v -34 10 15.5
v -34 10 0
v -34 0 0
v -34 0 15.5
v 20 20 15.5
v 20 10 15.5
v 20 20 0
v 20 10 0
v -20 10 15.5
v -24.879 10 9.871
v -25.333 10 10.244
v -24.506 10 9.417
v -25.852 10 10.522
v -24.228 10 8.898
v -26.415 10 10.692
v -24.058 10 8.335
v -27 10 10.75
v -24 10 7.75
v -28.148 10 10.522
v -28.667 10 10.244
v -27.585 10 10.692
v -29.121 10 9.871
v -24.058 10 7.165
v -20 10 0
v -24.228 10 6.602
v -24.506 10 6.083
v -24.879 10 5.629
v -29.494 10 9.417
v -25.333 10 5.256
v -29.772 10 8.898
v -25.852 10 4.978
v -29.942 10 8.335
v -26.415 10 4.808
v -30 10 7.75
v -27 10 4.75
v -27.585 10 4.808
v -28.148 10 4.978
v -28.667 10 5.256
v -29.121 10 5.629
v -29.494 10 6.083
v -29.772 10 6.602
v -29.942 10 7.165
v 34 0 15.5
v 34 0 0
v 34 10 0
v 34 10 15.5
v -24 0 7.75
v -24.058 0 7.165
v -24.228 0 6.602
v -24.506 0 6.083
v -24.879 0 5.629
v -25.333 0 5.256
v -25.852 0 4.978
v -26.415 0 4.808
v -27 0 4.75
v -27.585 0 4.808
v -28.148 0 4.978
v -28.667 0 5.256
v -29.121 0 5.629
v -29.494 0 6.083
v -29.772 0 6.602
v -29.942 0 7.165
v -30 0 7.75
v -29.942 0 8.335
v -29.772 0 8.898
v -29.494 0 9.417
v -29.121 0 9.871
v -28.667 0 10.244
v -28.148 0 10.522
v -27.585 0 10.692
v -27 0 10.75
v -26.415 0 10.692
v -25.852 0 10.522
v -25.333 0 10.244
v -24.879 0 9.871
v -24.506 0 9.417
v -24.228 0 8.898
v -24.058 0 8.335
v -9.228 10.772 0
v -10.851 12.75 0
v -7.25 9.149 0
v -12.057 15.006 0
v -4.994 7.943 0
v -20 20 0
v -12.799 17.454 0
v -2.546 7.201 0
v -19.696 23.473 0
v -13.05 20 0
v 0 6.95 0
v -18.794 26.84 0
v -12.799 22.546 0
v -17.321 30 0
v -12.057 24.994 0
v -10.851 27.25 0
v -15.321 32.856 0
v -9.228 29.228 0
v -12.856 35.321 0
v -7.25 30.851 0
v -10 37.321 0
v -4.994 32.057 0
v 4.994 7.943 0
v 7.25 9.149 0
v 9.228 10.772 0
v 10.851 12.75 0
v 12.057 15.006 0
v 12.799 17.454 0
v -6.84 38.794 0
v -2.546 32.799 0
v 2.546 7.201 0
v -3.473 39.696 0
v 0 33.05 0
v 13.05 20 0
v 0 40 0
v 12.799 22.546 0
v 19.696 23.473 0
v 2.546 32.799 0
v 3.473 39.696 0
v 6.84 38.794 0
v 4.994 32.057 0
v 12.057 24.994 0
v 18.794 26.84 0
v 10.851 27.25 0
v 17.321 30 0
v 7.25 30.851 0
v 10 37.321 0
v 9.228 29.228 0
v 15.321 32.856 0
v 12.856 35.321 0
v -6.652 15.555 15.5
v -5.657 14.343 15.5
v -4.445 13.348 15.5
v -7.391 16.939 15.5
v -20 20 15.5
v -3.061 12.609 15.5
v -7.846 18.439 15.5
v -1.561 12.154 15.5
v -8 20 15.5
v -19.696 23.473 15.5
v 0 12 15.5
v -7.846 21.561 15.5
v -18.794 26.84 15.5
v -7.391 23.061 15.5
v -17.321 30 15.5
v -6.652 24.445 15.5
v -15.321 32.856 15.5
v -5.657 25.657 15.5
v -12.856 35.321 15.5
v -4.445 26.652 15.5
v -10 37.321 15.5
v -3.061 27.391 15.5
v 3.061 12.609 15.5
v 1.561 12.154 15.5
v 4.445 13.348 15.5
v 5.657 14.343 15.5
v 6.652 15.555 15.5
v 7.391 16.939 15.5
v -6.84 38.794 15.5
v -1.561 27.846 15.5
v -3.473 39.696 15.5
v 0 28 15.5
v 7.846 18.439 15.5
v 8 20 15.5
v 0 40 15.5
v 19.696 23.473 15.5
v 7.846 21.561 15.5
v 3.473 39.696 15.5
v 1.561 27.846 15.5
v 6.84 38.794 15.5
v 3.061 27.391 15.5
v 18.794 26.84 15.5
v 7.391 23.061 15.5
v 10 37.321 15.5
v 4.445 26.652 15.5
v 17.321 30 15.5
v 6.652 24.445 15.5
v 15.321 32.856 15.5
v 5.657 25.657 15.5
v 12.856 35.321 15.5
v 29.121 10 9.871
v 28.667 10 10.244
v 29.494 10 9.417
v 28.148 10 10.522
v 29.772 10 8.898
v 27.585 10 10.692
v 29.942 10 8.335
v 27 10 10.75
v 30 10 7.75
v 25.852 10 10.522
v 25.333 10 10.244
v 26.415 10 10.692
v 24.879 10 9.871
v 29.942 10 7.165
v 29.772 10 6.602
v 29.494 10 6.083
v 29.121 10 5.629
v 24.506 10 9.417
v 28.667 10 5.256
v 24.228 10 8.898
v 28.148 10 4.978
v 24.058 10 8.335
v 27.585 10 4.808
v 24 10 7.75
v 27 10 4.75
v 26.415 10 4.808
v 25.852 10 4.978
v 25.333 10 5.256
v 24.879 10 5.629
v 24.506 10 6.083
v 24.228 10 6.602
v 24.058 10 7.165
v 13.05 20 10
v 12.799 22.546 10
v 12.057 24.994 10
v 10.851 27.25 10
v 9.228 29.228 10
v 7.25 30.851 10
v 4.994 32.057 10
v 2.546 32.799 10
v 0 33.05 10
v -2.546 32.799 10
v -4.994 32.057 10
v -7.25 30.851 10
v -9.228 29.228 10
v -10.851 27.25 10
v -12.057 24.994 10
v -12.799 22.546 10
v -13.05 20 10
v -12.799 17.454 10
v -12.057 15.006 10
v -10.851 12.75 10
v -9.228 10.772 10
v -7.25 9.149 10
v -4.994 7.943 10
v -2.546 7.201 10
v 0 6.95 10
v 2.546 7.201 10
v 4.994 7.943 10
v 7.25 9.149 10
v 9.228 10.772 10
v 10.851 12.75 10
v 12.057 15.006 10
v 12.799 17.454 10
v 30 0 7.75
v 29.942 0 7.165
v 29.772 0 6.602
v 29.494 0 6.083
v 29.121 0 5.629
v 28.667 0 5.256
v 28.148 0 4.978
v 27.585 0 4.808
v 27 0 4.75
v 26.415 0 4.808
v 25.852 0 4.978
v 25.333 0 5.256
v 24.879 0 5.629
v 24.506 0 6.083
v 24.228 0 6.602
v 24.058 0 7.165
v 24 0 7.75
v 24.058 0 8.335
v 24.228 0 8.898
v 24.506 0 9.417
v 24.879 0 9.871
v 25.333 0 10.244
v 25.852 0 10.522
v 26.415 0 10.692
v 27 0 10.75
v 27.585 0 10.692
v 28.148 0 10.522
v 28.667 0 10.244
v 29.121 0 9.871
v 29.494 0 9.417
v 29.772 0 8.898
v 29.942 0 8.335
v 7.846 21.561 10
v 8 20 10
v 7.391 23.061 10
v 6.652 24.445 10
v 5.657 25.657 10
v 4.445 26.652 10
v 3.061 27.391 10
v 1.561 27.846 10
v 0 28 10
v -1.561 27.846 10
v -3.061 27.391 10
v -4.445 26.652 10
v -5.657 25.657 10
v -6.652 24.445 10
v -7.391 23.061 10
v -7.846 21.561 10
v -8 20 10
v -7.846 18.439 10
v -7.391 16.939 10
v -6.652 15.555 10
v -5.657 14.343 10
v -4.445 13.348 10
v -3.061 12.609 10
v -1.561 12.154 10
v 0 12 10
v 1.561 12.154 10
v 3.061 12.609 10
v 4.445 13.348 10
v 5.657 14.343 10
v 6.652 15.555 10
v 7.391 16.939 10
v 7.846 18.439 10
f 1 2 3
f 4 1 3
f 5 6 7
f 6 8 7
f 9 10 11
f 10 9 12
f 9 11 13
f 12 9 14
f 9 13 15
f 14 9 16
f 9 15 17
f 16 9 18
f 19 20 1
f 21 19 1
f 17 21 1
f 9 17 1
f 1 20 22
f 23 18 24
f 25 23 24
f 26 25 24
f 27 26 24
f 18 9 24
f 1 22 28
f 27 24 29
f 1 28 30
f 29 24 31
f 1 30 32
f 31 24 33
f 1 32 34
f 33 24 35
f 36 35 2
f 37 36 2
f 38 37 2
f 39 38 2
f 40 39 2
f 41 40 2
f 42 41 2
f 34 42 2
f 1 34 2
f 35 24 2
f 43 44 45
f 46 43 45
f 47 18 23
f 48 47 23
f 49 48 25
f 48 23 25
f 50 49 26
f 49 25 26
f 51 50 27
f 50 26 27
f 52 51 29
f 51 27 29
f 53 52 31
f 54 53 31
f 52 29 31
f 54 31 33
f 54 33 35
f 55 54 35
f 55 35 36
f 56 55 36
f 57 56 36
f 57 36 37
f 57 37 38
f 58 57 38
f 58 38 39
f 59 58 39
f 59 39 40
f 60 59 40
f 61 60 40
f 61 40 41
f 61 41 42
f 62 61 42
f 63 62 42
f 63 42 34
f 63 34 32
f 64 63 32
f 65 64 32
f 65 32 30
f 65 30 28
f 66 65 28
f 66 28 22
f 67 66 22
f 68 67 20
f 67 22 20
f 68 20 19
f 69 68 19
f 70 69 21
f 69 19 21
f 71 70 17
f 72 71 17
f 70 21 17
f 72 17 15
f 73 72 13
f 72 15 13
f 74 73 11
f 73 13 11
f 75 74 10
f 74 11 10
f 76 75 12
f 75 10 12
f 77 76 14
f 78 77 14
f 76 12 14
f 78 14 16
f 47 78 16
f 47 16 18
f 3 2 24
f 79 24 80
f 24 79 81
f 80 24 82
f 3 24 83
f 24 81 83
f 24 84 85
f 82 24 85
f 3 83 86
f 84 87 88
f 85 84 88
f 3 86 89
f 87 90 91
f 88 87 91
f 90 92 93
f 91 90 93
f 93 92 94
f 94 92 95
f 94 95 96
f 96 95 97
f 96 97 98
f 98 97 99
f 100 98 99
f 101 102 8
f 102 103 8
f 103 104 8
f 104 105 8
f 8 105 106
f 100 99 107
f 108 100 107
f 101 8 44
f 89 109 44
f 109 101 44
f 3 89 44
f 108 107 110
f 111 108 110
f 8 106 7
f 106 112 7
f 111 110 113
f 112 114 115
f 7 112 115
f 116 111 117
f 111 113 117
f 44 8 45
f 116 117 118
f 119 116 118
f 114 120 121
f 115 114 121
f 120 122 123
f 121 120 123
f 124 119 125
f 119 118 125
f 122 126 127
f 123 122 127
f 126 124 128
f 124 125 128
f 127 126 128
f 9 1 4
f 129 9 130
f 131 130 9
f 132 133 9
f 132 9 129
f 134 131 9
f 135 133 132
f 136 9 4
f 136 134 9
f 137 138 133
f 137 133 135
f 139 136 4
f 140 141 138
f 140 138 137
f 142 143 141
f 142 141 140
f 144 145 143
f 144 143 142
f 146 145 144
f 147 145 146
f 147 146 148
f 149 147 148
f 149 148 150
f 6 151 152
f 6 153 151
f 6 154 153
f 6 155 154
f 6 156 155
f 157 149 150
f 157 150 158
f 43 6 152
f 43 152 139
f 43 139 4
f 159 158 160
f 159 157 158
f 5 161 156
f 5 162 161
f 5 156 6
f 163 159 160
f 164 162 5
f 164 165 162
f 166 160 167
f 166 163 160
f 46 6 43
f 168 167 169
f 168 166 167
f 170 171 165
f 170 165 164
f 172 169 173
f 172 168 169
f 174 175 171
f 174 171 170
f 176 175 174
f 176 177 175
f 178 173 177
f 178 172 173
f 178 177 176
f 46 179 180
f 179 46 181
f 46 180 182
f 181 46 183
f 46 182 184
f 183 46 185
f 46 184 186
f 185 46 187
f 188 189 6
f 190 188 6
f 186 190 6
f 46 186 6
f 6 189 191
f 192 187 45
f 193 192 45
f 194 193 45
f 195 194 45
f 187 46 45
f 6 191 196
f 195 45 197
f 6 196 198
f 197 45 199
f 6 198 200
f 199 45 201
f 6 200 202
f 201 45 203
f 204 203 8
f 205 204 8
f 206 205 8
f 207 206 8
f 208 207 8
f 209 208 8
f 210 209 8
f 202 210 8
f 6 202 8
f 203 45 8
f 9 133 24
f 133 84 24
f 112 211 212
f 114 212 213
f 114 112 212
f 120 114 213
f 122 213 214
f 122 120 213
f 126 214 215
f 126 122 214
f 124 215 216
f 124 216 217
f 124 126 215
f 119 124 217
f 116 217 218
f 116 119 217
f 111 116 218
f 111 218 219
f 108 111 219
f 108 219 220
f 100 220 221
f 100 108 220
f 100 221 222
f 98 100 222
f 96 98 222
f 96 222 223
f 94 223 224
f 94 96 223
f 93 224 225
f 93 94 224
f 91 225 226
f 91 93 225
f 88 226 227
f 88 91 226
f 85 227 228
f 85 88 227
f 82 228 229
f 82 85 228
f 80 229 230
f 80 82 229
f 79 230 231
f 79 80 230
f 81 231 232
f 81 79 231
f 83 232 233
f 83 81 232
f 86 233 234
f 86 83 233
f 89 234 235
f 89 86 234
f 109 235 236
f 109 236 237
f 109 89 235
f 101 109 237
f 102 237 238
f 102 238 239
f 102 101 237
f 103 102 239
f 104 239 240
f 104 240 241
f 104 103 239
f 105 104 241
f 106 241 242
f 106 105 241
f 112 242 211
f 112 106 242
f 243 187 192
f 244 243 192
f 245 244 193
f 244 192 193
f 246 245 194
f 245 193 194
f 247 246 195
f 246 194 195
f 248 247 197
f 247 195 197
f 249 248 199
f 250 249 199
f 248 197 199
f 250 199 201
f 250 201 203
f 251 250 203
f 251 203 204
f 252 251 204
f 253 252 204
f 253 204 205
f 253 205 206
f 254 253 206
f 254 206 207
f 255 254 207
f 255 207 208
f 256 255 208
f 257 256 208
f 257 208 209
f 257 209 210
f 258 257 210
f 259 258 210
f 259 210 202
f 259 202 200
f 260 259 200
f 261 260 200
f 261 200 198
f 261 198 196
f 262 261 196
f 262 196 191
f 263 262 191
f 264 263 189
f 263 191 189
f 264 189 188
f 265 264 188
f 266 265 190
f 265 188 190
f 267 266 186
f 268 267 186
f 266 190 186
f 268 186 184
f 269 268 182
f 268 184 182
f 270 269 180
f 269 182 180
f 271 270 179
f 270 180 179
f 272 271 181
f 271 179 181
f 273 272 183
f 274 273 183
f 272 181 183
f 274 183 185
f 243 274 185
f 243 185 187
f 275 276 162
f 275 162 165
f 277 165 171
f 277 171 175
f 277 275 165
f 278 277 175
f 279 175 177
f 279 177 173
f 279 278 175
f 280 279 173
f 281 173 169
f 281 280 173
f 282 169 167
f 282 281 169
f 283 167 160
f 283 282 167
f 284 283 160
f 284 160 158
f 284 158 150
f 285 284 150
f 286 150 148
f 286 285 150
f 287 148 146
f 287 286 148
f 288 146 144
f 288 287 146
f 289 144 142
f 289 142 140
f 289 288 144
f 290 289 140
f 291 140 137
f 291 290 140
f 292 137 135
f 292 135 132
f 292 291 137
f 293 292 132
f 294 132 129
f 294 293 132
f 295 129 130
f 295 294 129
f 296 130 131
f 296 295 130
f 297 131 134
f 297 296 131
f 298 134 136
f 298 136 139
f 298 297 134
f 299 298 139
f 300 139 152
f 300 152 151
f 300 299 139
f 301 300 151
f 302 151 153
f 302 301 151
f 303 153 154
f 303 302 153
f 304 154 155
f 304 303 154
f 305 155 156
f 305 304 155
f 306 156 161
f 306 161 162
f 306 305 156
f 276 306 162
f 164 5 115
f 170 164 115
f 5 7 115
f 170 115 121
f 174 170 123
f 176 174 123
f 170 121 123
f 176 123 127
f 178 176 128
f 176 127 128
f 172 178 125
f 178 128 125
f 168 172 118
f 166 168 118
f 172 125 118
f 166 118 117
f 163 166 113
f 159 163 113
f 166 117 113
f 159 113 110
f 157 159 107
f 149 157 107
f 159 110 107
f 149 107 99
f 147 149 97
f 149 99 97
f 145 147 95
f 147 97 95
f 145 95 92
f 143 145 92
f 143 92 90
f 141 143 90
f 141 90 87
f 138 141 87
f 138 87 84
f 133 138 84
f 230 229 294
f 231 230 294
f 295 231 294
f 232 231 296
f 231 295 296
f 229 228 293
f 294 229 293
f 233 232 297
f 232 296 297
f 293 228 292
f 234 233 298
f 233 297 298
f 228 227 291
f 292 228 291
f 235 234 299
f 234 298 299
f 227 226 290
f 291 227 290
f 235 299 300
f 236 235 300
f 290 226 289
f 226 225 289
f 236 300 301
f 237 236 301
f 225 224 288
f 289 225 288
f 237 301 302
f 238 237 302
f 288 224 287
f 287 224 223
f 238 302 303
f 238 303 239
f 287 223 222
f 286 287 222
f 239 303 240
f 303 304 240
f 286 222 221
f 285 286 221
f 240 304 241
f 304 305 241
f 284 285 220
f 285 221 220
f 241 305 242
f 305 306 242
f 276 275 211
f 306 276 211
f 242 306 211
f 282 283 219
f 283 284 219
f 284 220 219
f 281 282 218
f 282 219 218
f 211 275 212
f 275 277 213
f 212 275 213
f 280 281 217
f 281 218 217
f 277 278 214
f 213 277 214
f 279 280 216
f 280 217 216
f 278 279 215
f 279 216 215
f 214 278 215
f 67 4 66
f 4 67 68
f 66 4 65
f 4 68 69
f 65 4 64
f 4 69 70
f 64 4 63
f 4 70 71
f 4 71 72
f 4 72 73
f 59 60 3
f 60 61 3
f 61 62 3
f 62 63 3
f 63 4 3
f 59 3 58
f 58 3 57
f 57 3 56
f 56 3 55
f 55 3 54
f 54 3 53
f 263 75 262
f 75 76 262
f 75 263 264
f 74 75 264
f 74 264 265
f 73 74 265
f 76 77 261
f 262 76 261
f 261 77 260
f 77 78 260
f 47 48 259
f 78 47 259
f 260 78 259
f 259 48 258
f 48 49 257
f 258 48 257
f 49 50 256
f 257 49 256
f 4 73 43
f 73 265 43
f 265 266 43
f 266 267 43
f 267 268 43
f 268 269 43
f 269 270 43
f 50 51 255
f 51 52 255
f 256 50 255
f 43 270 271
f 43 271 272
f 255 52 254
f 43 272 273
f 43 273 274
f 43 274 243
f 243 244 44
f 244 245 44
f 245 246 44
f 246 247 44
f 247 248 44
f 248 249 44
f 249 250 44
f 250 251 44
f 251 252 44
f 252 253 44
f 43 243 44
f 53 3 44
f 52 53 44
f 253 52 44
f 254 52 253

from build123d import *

# Parameters (mm, degrees)
SKETCH1_R           = 13.05
BOSS_EXTRUDE1_DEPTH = 10
SKETCH2_R           = 8
BOSS_EXTRUDE2_DEPTH = 5.5
SKETCH3_R           = 3
CUT_EXTRUDE1_DEPTH  = 11


with BuildPart() as part:
    # Sketch1 → Boss-Extrude1 (new body)
    with BuildSketch(Plane.XY):
        with BuildLine():
            Line((-34, 0), (34, 0))
            Line((34, 0), (34, 10))
            Line((34, 10), (20, 10))
            Line((20, 10), (20, 20))
            ThreePointArc((20, 20), (0, 40), (-20, 20))
            Line((-20, 20), (-20, 10))
            Line((-20, 10), (-34, 10))
            Line((-34, 10), (-34, 0))
        make_face()
        with Locations((0, 20)):
            Circle(SKETCH1_R, mode=Mode.SUBTRACT)
    extrude(amount=BOSS_EXTRUDE1_DEPTH)

    # Sketch2 → Boss-Extrude2 (add)
    with BuildSketch(Plane.XY.offset(10)):
        with BuildLine():
            Line((34, 0), (34, 10))
            Line((34, 10), (20, 10))
            Line((20, 10), (20, 20))
            ThreePointArc((20, 20), (0, 40), (-20, 20))
            Line((-20, 20), (-20, 10))
            Line((-20, 10), (-34, 10))
            Line((-34, 10), (-34, 0))
            Line((-34, 0), (34, 0))
        make_face()
        with Locations((0, 20)):
            Circle(SKETCH2_R, mode=Mode.SUBTRACT)
    extrude(amount=BOSS_EXTRUDE2_DEPTH)

    # Sketch3 → Cut-Extrude1 (cut, through all)
    with BuildSketch(Plane(origin=(0, 10, 0), x_dir=(1, 0, 0), z_dir=(0, 1, 0))):
        with Locations((27, -7.75)):
            Circle(SKETCH3_R)
        with Locations((-27, -7.75)):
            Circle(SKETCH3_R)
    extrude(amount=-CUT_EXTRUDE1_DEPTH, mode=Mode.SUBTRACT)


solid = part.part
